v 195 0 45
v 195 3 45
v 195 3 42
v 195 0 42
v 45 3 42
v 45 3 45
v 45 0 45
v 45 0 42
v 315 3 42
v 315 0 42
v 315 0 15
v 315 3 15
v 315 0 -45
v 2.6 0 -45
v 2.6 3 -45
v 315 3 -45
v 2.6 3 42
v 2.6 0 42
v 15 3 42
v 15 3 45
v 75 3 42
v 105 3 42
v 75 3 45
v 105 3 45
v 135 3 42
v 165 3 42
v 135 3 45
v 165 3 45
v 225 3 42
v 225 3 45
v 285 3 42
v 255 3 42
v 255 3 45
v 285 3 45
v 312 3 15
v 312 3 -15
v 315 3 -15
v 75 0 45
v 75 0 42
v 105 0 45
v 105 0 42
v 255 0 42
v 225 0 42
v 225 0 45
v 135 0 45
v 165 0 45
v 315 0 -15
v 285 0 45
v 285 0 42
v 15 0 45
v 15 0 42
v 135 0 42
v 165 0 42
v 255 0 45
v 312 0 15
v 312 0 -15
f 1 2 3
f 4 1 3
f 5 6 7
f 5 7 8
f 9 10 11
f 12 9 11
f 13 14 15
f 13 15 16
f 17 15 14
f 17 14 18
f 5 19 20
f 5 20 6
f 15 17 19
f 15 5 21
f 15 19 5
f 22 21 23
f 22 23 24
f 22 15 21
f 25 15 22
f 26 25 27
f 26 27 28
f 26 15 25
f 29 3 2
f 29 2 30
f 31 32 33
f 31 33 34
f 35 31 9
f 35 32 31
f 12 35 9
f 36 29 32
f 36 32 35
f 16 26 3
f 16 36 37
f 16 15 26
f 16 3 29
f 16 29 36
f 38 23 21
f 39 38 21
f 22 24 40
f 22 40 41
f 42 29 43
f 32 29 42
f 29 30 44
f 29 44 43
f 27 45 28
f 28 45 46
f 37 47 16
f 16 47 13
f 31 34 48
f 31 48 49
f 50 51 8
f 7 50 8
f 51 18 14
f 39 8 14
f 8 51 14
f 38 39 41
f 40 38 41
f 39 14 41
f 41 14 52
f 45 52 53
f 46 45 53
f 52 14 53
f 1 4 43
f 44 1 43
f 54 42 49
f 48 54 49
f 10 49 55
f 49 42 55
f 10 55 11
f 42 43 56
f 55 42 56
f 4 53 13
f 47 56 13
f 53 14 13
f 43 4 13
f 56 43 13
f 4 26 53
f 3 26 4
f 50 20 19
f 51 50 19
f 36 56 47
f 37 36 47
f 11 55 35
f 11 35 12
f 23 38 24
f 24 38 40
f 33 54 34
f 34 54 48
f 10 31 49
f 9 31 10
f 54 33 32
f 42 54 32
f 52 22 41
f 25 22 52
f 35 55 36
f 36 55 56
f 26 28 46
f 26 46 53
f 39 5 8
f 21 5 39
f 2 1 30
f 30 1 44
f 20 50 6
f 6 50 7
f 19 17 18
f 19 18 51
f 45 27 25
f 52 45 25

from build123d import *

# Parameters (mm, degrees)
SKETCH1_W              = 630
SKETCH1_H              = 90
BOSS_EXTRUDE1_DEPTH    = 3
SKETCH3_W              = 30
SKETCH3_H              = 3
CUT_EXTRUDE1_DEPTH     = 3
LPATTERN1_COUNT        = 10
LPATTERN1_PITCH        = 60
LPATTERN1_COL_COUNT    = 2
LPATTERN1_COL_PITCH    = 60
CUT_EXTRUDE5_START     = -3
CUT_EXTRUDE5_OUTLINE_W = 3
CUT_EXTRUDE5_OUTLINE_H = 30
CUT_EXTRUDE5_DEPTH     = 3
SKETCH7_W              = 3
SKETCH7_H              = 30
CUT_EXTRUDE3_DEPTH     = 3
SKETCH13_W             = 3
SKETCH13_H             = 27
CUT_EXTRUDE4_DEPTH     = 10


# Read off the part's stored shape, not the designer's step: Cut-Extrude5
with BuildPart() as part:
    # Sketch1 → Boss-Extrude1 (new body)
    with BuildSketch(Plane(origin=(0, 0, 0), x_dir=(1, 0, 0), z_dir=(0, 1, 0))):
        Rectangle(SKETCH1_W, SKETCH1_H)
    extrude(amount=BOSS_EXTRUDE1_DEPTH)

    # Sketch3 → Cut-Extrude1 (cut)
    with BuildSketch(Plane(origin=(0, 3, 0), x_dir=(1, 0, 0), z_dir=(0, 1, 0))):
        with Locations((-240, -43.5)):
            Rectangle(SKETCH3_W, SKETCH3_H)
    cut_extrude1 = extrude(amount=-CUT_EXTRUDE1_DEPTH, mode=Mode.SUBTRACT)

    # LPattern1: Cut-Extrude1 ×10
    with Locations(*[(i * LPATTERN1_PITCH, 0, 0) for i in range(1, LPATTERN1_COUNT)]):
        add(cut_extrude1, mode=Mode.SUBTRACT)

    # LPattern1 col: Cut-Extrude1 ×2
    with Locations(*[(-i * LPATTERN1_COL_PITCH, 0, 0) for i in range(1, LPATTERN1_COL_COUNT)]):
        add(cut_extrude1, mode=Mode.SUBTRACT)

    # Cut-Extrude5 outline → Cut-Extrude5 (cut)
    with BuildSketch(Plane(origin=(0, 3, 0), x_dir=(1, 0, 0), z_dir=(0, 1, 0)).offset(CUT_EXTRUDE5_START)):
        with Locations((313.5, 1e-09)):
            Rectangle(CUT_EXTRUDE5_OUTLINE_W, CUT_EXTRUDE5_OUTLINE_H)
    extrude(amount=CUT_EXTRUDE5_DEPTH, mode=Mode.SUBTRACT)

    # Sketch7 → Cut-Extrude3 (cut)
    with BuildSketch(Plane(origin=(0, 3, 0), x_dir=(1, 0, 0), z_dir=(0, 1, 0))):
        with Locations((-313.5, 30)):
            Rectangle(SKETCH7_W, SKETCH7_H)
    extrude(amount=-CUT_EXTRUDE3_DEPTH, mode=Mode.SUBTRACT)

    # Sketch13 → Cut-Extrude4 (cut)
    with BuildSketch(Plane(origin=(0, 3, 0), x_dir=(1, 0, 0), z_dir=(0, 1, 0))):
        with Locations((-313.5, -28.5)):
            Rectangle(SKETCH13_W, SKETCH13_H)
    extrude(amount=-CUT_EXTRUDE4_DEPTH, mode=Mode.SUBTRACT)

    # SurfaceCut1
    split(bisect_by=Plane.ZY.offset(-2.6), keep=Keep.BOTTOM)


solid = part.part
